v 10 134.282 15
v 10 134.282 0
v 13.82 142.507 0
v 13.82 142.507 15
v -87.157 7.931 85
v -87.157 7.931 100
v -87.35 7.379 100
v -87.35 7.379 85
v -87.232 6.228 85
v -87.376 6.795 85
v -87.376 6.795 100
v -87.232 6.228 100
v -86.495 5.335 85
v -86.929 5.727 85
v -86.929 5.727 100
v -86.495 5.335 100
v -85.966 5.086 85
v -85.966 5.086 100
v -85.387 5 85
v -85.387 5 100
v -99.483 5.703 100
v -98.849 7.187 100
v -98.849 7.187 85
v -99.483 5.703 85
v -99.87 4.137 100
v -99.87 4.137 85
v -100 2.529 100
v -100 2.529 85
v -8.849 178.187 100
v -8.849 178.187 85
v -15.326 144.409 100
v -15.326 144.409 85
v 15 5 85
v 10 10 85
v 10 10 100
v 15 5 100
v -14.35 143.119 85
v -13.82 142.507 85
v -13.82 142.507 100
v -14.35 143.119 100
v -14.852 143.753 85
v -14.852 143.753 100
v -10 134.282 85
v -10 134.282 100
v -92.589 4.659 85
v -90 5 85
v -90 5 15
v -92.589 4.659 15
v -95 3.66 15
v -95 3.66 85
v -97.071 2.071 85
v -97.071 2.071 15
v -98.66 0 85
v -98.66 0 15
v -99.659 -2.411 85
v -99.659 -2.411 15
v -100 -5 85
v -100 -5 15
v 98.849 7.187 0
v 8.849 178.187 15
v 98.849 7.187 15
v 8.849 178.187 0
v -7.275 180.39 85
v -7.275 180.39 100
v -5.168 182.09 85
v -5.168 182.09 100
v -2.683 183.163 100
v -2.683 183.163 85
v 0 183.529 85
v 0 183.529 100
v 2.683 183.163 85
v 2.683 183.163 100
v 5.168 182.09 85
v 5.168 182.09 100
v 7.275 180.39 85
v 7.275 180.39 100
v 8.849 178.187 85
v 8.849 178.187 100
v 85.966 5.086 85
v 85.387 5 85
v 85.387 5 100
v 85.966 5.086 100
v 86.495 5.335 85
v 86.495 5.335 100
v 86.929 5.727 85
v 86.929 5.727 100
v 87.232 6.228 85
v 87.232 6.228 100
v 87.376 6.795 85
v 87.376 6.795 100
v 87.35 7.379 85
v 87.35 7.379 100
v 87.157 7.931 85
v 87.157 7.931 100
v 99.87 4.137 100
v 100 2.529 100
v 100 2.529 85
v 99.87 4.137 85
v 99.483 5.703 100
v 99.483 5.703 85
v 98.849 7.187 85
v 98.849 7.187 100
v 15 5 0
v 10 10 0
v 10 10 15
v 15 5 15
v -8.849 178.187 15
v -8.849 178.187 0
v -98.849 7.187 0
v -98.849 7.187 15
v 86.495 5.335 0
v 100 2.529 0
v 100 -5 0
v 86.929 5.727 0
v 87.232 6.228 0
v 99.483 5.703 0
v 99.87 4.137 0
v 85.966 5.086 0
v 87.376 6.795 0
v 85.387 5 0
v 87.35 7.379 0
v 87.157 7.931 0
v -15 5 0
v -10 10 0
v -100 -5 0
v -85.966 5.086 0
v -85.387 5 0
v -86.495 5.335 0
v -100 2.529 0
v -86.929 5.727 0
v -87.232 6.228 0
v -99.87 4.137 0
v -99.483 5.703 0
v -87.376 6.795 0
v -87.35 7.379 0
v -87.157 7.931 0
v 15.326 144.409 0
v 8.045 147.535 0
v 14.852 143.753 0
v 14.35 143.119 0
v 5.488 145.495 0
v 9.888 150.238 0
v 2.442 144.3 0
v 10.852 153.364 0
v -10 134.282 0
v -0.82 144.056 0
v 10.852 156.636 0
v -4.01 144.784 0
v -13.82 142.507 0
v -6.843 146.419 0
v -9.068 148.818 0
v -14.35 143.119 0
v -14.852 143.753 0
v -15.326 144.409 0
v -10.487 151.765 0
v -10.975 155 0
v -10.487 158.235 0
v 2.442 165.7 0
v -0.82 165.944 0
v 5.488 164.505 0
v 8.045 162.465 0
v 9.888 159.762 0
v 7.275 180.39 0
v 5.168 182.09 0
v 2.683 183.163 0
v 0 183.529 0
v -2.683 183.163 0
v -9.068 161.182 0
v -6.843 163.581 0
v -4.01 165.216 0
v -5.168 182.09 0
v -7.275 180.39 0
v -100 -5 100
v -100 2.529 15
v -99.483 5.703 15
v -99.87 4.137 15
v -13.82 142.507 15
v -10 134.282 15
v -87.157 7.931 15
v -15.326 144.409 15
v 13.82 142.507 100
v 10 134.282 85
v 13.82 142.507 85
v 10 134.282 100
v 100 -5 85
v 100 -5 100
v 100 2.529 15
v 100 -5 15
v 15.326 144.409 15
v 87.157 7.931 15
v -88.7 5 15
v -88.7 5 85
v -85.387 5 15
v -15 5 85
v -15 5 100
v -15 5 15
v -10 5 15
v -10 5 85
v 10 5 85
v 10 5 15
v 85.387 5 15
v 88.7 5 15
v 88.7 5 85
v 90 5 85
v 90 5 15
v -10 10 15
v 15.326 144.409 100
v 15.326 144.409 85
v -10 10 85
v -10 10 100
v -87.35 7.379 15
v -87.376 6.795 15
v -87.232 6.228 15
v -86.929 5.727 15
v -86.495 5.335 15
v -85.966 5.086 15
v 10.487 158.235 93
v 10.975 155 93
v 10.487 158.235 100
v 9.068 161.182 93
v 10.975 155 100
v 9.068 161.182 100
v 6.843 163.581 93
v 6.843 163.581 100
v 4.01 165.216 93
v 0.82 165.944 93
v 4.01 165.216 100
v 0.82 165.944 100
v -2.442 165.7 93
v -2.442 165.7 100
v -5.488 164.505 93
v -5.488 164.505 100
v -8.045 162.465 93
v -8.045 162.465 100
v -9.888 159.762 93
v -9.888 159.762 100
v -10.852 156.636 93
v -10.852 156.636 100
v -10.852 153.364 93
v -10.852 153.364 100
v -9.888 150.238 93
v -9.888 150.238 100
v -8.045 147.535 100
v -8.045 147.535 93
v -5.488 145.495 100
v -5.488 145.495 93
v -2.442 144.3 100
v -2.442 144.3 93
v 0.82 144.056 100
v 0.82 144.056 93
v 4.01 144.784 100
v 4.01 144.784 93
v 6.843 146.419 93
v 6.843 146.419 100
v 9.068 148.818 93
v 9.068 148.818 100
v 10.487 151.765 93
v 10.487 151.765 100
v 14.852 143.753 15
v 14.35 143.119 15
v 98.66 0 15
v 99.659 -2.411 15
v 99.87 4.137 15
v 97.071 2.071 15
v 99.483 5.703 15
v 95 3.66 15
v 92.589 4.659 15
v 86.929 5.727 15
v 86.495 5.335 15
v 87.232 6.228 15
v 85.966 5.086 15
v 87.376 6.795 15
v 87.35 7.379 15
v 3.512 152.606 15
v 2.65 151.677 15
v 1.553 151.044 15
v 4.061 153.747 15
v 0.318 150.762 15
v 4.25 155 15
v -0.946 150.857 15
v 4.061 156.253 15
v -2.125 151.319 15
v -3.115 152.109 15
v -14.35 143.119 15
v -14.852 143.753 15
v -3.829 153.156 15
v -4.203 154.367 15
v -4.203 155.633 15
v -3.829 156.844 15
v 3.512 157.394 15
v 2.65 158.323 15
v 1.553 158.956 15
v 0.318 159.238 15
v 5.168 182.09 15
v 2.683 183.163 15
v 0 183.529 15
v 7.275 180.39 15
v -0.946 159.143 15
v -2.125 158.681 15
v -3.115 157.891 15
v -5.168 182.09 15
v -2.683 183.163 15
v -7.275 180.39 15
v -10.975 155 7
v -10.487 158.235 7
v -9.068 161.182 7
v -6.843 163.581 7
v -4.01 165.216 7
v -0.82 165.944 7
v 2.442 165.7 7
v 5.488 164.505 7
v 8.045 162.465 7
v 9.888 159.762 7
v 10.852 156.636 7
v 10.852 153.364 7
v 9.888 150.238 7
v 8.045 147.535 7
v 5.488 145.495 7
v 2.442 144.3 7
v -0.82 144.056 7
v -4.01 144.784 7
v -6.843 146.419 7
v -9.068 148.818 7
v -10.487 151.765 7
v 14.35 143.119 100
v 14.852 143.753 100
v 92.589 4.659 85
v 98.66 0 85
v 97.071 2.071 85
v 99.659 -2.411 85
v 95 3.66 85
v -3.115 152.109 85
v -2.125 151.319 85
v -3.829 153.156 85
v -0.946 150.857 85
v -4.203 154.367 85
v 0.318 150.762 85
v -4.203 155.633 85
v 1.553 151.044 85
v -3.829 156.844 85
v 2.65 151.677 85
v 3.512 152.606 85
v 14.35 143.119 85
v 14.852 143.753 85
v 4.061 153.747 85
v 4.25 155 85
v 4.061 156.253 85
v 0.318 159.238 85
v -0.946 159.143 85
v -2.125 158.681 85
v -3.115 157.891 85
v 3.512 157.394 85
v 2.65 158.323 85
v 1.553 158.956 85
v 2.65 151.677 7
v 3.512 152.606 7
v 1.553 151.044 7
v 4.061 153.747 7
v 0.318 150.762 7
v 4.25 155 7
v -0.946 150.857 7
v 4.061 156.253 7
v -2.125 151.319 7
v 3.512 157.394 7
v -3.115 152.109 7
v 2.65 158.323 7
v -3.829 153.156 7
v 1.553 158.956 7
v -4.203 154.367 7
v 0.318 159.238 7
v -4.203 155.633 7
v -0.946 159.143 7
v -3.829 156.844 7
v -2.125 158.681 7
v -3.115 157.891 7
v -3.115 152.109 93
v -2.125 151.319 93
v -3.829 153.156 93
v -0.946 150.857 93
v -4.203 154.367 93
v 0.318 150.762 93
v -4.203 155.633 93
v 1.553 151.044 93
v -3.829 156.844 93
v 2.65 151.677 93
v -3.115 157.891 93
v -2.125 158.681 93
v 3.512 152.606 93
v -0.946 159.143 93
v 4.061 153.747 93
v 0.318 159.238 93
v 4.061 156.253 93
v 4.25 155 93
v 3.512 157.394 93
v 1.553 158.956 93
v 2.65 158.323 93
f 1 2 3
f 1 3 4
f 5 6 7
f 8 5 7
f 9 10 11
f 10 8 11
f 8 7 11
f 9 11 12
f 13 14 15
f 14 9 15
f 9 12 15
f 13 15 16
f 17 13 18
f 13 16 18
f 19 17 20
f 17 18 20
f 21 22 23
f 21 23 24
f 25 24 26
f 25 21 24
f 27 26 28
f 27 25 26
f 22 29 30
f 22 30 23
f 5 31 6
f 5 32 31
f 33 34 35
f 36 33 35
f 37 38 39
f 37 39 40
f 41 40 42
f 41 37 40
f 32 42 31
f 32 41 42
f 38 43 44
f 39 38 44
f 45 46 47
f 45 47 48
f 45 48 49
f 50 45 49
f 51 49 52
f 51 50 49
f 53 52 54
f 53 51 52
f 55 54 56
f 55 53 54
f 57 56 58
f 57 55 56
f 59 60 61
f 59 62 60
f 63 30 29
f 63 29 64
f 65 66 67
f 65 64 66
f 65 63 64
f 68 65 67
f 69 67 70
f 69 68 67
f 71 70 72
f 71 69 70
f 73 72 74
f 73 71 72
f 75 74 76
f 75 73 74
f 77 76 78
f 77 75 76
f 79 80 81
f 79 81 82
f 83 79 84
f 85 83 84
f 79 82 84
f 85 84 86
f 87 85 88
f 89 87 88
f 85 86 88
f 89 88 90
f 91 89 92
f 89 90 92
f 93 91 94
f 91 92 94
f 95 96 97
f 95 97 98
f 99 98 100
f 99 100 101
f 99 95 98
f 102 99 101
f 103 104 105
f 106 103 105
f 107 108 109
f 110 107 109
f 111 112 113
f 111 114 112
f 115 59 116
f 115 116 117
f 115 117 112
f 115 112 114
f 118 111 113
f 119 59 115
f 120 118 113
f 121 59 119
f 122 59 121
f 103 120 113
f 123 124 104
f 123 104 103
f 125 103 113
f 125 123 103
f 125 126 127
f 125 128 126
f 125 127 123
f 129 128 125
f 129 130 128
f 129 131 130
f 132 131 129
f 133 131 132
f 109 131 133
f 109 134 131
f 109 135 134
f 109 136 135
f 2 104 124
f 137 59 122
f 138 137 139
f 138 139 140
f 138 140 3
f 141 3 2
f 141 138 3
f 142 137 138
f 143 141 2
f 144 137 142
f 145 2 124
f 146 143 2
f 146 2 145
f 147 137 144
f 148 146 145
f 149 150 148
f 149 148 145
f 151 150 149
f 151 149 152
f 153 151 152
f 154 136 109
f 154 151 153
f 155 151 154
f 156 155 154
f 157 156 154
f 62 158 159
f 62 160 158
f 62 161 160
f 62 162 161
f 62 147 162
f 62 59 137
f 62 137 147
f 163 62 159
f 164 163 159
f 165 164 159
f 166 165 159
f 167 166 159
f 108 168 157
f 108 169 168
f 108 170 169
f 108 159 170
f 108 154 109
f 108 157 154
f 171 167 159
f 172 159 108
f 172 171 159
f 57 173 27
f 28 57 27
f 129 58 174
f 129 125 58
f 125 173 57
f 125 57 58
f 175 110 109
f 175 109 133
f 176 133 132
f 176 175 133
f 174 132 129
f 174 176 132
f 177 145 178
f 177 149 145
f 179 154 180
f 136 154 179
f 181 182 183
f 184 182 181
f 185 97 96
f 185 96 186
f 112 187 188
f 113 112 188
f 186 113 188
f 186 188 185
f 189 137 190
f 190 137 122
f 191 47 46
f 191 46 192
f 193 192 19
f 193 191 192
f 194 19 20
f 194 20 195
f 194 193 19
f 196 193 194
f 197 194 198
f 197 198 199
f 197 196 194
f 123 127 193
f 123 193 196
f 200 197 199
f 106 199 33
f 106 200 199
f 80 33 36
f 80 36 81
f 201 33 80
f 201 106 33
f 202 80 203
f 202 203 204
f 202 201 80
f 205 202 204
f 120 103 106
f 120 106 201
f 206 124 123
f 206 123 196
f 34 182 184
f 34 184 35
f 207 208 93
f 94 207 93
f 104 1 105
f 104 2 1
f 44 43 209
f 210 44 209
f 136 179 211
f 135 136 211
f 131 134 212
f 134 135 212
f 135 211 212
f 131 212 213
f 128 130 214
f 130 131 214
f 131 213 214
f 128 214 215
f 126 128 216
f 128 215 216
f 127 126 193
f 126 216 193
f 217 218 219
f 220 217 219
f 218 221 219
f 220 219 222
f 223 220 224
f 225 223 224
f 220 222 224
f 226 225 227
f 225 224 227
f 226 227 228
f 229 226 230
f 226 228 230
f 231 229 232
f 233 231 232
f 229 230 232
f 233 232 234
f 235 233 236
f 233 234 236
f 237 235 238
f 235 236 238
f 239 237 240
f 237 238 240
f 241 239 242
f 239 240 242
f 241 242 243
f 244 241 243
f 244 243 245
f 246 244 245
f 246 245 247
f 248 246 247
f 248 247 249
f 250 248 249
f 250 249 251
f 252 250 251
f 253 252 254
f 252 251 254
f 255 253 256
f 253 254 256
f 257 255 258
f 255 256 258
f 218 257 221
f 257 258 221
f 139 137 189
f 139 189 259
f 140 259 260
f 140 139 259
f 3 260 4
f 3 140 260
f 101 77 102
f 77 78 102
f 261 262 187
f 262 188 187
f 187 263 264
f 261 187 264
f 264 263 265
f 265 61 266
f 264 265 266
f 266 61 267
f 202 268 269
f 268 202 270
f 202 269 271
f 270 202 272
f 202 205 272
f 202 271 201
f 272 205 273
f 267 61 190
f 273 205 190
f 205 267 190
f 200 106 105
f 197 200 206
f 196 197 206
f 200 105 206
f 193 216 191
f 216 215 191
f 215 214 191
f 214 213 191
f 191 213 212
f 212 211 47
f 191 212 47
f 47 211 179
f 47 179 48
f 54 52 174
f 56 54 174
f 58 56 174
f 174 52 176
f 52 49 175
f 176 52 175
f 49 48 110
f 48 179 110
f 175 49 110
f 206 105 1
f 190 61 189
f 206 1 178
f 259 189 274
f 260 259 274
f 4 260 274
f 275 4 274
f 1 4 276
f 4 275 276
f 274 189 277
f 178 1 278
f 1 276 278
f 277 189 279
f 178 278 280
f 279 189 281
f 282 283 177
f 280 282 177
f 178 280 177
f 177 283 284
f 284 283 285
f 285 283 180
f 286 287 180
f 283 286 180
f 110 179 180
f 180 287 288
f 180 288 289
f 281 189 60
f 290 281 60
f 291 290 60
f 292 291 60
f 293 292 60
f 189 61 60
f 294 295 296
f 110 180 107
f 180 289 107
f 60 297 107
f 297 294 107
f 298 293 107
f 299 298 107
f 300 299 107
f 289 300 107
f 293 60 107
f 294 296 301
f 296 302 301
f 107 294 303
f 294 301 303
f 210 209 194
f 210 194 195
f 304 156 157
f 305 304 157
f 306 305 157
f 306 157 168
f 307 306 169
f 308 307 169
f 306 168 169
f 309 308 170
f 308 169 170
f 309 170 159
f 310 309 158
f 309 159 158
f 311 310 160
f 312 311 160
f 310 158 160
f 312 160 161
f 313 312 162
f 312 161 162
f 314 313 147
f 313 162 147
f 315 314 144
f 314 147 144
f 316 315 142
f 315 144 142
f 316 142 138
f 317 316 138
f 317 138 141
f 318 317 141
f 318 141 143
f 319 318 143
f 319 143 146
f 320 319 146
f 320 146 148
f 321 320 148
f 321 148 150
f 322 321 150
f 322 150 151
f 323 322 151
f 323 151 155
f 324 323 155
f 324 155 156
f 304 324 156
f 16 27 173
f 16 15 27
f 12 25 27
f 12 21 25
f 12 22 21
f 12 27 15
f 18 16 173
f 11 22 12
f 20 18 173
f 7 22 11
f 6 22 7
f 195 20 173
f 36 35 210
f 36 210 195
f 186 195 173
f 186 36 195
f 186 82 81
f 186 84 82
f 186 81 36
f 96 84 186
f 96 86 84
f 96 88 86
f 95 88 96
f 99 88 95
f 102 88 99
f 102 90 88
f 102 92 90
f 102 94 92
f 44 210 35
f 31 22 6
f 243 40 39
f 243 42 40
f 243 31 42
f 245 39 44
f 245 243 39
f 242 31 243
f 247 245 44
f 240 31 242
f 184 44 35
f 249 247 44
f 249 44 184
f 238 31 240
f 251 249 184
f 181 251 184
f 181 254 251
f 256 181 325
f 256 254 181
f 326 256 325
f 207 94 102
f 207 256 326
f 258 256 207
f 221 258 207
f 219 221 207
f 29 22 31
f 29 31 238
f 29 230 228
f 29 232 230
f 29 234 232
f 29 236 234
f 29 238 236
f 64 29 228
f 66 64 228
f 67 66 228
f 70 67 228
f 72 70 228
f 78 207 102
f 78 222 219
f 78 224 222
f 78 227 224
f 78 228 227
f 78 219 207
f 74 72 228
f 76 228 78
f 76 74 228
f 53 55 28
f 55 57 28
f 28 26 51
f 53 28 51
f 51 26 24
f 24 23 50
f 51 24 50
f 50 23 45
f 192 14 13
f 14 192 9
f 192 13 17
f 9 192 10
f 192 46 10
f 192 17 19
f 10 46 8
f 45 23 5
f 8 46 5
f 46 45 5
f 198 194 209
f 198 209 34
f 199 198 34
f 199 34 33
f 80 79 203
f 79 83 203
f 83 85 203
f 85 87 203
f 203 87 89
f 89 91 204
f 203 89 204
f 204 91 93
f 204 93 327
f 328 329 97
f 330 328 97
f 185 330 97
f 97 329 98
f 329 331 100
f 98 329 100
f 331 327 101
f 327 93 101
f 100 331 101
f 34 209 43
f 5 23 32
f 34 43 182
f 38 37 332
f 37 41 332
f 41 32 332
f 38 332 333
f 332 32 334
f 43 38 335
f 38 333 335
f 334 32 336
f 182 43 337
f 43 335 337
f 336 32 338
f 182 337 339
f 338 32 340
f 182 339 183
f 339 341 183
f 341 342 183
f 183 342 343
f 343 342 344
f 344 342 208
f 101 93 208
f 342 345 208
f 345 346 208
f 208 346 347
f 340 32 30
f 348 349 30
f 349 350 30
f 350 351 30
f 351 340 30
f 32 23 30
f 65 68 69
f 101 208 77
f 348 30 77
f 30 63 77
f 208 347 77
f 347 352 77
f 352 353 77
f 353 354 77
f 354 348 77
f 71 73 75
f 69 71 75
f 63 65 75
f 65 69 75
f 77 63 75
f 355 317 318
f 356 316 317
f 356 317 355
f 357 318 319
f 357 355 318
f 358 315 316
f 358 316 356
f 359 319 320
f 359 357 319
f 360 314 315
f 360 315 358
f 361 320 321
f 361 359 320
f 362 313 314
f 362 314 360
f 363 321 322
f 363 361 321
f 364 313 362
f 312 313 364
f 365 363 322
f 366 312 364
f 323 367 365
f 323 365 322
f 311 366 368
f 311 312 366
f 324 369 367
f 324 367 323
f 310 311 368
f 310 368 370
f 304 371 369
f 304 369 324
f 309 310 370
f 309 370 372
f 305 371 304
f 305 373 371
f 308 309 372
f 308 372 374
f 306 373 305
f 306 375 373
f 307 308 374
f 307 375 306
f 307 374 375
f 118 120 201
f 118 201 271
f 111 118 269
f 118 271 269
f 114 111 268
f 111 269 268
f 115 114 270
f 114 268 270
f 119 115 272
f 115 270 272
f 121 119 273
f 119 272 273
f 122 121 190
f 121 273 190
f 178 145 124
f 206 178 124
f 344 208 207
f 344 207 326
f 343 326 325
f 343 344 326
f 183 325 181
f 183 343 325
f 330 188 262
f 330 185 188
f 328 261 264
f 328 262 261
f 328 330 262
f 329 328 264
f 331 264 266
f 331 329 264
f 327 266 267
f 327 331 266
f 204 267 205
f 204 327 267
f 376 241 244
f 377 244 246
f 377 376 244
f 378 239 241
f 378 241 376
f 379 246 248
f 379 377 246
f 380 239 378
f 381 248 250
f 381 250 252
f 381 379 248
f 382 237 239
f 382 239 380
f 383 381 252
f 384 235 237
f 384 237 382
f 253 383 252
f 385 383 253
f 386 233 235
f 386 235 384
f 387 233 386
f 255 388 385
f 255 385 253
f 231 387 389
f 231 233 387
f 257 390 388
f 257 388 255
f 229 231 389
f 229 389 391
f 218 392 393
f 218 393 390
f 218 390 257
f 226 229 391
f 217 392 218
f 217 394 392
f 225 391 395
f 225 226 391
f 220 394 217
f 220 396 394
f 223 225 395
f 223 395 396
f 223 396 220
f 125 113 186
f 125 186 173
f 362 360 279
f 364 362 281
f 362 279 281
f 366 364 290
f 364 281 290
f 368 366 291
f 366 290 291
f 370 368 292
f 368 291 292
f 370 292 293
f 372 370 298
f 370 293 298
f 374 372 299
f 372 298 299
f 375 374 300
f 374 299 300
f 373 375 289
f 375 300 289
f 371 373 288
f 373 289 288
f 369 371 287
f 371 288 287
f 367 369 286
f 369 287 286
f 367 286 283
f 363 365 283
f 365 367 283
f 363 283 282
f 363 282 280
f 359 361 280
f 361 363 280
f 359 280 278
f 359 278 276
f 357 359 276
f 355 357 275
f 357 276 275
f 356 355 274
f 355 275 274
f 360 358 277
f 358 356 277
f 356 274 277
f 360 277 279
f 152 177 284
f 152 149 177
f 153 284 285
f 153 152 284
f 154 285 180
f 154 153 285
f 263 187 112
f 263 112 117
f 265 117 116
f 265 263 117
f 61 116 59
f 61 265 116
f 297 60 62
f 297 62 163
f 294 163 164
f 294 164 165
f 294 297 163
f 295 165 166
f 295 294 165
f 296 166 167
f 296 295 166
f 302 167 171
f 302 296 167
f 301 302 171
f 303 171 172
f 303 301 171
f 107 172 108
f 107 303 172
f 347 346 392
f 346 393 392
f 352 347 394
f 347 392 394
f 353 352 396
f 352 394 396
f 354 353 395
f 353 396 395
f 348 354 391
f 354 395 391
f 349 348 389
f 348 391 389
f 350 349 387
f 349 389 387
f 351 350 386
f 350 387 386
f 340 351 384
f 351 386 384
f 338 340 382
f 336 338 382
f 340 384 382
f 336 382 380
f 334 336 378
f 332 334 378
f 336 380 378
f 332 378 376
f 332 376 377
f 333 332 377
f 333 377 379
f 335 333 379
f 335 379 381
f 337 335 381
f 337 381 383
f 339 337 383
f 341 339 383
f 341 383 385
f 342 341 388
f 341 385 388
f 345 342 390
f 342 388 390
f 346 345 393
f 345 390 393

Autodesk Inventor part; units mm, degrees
ref_plane "YZ Plane" through (0, 0, 0) normal (1, 0, 0) x (0, 1, 0)
ref_plane "XZ Plane" through (0, 0, 0) normal (0, 1, 0) x (-1, 0, 0)
ref_plane "XY Plane" through (0, 0, 0) normal (0, 0, 1) x (1, 0, 0)
sketch "Esboço1" plane through (0, 0, 0) normal (0, 0, 1) x (1, 0, 0)
  line L0 (-100, 5) -> (100, 5)
  line L1 (100, 5) -> (100, -5)
  line L2 (100, -5) -> (-100, -5)
  line L3 (-100, -5) -> (-100, 5)
  line L4 (-100, 5) -> (100, -5) construction
  line L5 (100, 5) -> (-100, -5) construction
  point P0 (0, 0)
  dimension "d0" = 200
  dimension "d1" = 10
extrude "Extrusão1" add sketch "Esboço1" along normal blind 100
sketch "Esboço2" plane through (0, 0, 100) normal (0, 0, 1) x (1, 0, 0)
  line L0 (100, 5) -> (-100, 5) projected
  line L1 (100, 5) -> (-100, 5) projected
  line L2 (-100, -5) -> (100, -5) projected
  line L3 (0, -5) -> (0, 195) construction
  line L4 (0, 195) -> (-100, 5)
  line L5 (0, 195) -> (100, 5)
  point P0 (0, 0)
  point P1 (0, 5)
  dimension "d20" = 200
extrude "Extrusão2" add sketch "Esboço2" against normal blind 15
sketch "Esboço3" plane through (0, 0, 0) normal (0, 0, -1) x (-1, 0, 0)
  line L0 (-100, 5) -> (100, 5)
  line L1 (100, -5) -> (-100, -5) projected
  line L2 (0, -5) -> (0, 195) construction
  line L3 (-100, -5) -> (-100, 5) projected
  line L4 (0, 195) -> (-100, 5)
  line L5 (0, 195) -> (100, 5)
  point P0 (0, 0)
  dimension "d21" = 200
extrude "Extrusão3" add sketch "Esboço3" against normal blind 15
sketch "Esboço4" plane through (0, 0, 100) normal (0, 0, 1) x (1, 0, 0)
  circle A0 centre (0, 155) radius 4.25
  line L0 (-100, -5) -> (100, -5) projected
  line L1 (100, 5) -> (0, 195) projected
  line L2 (0, 195) -> (0, -5) construction
  point P0 (0, 0)
  dimension "d13" = 8.5
  dimension "d22" = 160
extrude "Extrusão4" cut sketch "Esboço4" against normal through all
fillet "Arredondamento3" radius 10 2 edges at (0, 195, 92.5) (0, 195, 7.5)
sketch "Esboço5" plane through (0, 0, 100) normal (0, 0, 1) x (1, 0, 0)
  circle A0 centre (0, 155) radius 4.25 projected
  circle A1 centre (0, 155) radius 10.975
  point P0 (0, 0)
  dimension "d25" = 21.95
extrude "Extrusão5" cut sketch "Esboço5" against normal blind 7
sketch "Esboço6" plane through (0, 0, 0) normal (0, 0, -1) x (-1, 0, 0)
  circle A0 centre (0, 155) radius 4.25 projected
  circle A1 centre (0, 155) radius 10.975
  point P0 (0, 0)
  dimension "d28" = 21.95
extrude "Extrusão6" cut sketch "Esboço6" against normal blind 7
sketch "Esboço7" plane through (0, 0, 0) normal (0, 0, -1) x (-1, 0, 0)
  circle A0 centre (0, 155) radius 10.975 projected
  circle A1 centre (0, 155) radius 18.6299
  line L0 (100, 5) -> (8.8492, 178.1866) projected
  line L1 (15.3264, 144.4089) -> (88.6995, 5)
  line L2 (100, 5) -> (-100, 5) projected
  line L3 (88.6995, 5) -> (-88.6995, 5)
  line L4 (-15.3264, 144.4089) -> (-88.6995, 5)
  line L5 (100, 5) -> (8.8492, 178.1866) projected
  line L6 (-8.8492, 178.1866) -> (-100, 5) projected
  circle A2 centre (0, 155) radius 4.25 projected
  line L7 (0, 155) -> (0, -5.3042)
  line L8 (10, 139.2815) -> (10, 5)
  line L9 (-10, 139.2815) -> (-10, 5)
  point P0 (0, 0)
  point P1 (-10.946, 174.2026)
  point P2 (10.946, 174.2026)
  dimension "d31" = 10
  dimension "d32" = 10
  dimension "d39" = 10
  dimension "d40" = 10
extrude "Extrusão7" cut sketch "Esboço7" against normal through all contours L9 L2 L4 A1 | A1 L1 L2 L8
chamfer "Chanfro1" distance 5 angle 45 8 edges at (-10, 139.2815, 92.5) (10, 139.2815, 92.5) (10, 139.2815, 7.5) (-10, 139.2815, 7.5) (10, 5, 7.5) (-10, 5, 7.5) (-10, 5, 92.5) (10, 5, 92.5)
fillet "Arredondamento5" radius 2 4 edges at (88.6995, 5, 92.5) (-88.6995, 5, 92.5) (88.6995, 5, 7.5) (-88.6995, 5, 7.5)
fillet "Arredondamento6" radius 10 2 edges at (-100, 5, 50) (100, 5, 50)
fillet "Arredondamento7" radius 10 4 edges at (100, 5, 92.5) (100, 5, 7.5) (-100, 5, 92.5) (-100, 5, 7.5)
properties part number "EncaixeBase"
